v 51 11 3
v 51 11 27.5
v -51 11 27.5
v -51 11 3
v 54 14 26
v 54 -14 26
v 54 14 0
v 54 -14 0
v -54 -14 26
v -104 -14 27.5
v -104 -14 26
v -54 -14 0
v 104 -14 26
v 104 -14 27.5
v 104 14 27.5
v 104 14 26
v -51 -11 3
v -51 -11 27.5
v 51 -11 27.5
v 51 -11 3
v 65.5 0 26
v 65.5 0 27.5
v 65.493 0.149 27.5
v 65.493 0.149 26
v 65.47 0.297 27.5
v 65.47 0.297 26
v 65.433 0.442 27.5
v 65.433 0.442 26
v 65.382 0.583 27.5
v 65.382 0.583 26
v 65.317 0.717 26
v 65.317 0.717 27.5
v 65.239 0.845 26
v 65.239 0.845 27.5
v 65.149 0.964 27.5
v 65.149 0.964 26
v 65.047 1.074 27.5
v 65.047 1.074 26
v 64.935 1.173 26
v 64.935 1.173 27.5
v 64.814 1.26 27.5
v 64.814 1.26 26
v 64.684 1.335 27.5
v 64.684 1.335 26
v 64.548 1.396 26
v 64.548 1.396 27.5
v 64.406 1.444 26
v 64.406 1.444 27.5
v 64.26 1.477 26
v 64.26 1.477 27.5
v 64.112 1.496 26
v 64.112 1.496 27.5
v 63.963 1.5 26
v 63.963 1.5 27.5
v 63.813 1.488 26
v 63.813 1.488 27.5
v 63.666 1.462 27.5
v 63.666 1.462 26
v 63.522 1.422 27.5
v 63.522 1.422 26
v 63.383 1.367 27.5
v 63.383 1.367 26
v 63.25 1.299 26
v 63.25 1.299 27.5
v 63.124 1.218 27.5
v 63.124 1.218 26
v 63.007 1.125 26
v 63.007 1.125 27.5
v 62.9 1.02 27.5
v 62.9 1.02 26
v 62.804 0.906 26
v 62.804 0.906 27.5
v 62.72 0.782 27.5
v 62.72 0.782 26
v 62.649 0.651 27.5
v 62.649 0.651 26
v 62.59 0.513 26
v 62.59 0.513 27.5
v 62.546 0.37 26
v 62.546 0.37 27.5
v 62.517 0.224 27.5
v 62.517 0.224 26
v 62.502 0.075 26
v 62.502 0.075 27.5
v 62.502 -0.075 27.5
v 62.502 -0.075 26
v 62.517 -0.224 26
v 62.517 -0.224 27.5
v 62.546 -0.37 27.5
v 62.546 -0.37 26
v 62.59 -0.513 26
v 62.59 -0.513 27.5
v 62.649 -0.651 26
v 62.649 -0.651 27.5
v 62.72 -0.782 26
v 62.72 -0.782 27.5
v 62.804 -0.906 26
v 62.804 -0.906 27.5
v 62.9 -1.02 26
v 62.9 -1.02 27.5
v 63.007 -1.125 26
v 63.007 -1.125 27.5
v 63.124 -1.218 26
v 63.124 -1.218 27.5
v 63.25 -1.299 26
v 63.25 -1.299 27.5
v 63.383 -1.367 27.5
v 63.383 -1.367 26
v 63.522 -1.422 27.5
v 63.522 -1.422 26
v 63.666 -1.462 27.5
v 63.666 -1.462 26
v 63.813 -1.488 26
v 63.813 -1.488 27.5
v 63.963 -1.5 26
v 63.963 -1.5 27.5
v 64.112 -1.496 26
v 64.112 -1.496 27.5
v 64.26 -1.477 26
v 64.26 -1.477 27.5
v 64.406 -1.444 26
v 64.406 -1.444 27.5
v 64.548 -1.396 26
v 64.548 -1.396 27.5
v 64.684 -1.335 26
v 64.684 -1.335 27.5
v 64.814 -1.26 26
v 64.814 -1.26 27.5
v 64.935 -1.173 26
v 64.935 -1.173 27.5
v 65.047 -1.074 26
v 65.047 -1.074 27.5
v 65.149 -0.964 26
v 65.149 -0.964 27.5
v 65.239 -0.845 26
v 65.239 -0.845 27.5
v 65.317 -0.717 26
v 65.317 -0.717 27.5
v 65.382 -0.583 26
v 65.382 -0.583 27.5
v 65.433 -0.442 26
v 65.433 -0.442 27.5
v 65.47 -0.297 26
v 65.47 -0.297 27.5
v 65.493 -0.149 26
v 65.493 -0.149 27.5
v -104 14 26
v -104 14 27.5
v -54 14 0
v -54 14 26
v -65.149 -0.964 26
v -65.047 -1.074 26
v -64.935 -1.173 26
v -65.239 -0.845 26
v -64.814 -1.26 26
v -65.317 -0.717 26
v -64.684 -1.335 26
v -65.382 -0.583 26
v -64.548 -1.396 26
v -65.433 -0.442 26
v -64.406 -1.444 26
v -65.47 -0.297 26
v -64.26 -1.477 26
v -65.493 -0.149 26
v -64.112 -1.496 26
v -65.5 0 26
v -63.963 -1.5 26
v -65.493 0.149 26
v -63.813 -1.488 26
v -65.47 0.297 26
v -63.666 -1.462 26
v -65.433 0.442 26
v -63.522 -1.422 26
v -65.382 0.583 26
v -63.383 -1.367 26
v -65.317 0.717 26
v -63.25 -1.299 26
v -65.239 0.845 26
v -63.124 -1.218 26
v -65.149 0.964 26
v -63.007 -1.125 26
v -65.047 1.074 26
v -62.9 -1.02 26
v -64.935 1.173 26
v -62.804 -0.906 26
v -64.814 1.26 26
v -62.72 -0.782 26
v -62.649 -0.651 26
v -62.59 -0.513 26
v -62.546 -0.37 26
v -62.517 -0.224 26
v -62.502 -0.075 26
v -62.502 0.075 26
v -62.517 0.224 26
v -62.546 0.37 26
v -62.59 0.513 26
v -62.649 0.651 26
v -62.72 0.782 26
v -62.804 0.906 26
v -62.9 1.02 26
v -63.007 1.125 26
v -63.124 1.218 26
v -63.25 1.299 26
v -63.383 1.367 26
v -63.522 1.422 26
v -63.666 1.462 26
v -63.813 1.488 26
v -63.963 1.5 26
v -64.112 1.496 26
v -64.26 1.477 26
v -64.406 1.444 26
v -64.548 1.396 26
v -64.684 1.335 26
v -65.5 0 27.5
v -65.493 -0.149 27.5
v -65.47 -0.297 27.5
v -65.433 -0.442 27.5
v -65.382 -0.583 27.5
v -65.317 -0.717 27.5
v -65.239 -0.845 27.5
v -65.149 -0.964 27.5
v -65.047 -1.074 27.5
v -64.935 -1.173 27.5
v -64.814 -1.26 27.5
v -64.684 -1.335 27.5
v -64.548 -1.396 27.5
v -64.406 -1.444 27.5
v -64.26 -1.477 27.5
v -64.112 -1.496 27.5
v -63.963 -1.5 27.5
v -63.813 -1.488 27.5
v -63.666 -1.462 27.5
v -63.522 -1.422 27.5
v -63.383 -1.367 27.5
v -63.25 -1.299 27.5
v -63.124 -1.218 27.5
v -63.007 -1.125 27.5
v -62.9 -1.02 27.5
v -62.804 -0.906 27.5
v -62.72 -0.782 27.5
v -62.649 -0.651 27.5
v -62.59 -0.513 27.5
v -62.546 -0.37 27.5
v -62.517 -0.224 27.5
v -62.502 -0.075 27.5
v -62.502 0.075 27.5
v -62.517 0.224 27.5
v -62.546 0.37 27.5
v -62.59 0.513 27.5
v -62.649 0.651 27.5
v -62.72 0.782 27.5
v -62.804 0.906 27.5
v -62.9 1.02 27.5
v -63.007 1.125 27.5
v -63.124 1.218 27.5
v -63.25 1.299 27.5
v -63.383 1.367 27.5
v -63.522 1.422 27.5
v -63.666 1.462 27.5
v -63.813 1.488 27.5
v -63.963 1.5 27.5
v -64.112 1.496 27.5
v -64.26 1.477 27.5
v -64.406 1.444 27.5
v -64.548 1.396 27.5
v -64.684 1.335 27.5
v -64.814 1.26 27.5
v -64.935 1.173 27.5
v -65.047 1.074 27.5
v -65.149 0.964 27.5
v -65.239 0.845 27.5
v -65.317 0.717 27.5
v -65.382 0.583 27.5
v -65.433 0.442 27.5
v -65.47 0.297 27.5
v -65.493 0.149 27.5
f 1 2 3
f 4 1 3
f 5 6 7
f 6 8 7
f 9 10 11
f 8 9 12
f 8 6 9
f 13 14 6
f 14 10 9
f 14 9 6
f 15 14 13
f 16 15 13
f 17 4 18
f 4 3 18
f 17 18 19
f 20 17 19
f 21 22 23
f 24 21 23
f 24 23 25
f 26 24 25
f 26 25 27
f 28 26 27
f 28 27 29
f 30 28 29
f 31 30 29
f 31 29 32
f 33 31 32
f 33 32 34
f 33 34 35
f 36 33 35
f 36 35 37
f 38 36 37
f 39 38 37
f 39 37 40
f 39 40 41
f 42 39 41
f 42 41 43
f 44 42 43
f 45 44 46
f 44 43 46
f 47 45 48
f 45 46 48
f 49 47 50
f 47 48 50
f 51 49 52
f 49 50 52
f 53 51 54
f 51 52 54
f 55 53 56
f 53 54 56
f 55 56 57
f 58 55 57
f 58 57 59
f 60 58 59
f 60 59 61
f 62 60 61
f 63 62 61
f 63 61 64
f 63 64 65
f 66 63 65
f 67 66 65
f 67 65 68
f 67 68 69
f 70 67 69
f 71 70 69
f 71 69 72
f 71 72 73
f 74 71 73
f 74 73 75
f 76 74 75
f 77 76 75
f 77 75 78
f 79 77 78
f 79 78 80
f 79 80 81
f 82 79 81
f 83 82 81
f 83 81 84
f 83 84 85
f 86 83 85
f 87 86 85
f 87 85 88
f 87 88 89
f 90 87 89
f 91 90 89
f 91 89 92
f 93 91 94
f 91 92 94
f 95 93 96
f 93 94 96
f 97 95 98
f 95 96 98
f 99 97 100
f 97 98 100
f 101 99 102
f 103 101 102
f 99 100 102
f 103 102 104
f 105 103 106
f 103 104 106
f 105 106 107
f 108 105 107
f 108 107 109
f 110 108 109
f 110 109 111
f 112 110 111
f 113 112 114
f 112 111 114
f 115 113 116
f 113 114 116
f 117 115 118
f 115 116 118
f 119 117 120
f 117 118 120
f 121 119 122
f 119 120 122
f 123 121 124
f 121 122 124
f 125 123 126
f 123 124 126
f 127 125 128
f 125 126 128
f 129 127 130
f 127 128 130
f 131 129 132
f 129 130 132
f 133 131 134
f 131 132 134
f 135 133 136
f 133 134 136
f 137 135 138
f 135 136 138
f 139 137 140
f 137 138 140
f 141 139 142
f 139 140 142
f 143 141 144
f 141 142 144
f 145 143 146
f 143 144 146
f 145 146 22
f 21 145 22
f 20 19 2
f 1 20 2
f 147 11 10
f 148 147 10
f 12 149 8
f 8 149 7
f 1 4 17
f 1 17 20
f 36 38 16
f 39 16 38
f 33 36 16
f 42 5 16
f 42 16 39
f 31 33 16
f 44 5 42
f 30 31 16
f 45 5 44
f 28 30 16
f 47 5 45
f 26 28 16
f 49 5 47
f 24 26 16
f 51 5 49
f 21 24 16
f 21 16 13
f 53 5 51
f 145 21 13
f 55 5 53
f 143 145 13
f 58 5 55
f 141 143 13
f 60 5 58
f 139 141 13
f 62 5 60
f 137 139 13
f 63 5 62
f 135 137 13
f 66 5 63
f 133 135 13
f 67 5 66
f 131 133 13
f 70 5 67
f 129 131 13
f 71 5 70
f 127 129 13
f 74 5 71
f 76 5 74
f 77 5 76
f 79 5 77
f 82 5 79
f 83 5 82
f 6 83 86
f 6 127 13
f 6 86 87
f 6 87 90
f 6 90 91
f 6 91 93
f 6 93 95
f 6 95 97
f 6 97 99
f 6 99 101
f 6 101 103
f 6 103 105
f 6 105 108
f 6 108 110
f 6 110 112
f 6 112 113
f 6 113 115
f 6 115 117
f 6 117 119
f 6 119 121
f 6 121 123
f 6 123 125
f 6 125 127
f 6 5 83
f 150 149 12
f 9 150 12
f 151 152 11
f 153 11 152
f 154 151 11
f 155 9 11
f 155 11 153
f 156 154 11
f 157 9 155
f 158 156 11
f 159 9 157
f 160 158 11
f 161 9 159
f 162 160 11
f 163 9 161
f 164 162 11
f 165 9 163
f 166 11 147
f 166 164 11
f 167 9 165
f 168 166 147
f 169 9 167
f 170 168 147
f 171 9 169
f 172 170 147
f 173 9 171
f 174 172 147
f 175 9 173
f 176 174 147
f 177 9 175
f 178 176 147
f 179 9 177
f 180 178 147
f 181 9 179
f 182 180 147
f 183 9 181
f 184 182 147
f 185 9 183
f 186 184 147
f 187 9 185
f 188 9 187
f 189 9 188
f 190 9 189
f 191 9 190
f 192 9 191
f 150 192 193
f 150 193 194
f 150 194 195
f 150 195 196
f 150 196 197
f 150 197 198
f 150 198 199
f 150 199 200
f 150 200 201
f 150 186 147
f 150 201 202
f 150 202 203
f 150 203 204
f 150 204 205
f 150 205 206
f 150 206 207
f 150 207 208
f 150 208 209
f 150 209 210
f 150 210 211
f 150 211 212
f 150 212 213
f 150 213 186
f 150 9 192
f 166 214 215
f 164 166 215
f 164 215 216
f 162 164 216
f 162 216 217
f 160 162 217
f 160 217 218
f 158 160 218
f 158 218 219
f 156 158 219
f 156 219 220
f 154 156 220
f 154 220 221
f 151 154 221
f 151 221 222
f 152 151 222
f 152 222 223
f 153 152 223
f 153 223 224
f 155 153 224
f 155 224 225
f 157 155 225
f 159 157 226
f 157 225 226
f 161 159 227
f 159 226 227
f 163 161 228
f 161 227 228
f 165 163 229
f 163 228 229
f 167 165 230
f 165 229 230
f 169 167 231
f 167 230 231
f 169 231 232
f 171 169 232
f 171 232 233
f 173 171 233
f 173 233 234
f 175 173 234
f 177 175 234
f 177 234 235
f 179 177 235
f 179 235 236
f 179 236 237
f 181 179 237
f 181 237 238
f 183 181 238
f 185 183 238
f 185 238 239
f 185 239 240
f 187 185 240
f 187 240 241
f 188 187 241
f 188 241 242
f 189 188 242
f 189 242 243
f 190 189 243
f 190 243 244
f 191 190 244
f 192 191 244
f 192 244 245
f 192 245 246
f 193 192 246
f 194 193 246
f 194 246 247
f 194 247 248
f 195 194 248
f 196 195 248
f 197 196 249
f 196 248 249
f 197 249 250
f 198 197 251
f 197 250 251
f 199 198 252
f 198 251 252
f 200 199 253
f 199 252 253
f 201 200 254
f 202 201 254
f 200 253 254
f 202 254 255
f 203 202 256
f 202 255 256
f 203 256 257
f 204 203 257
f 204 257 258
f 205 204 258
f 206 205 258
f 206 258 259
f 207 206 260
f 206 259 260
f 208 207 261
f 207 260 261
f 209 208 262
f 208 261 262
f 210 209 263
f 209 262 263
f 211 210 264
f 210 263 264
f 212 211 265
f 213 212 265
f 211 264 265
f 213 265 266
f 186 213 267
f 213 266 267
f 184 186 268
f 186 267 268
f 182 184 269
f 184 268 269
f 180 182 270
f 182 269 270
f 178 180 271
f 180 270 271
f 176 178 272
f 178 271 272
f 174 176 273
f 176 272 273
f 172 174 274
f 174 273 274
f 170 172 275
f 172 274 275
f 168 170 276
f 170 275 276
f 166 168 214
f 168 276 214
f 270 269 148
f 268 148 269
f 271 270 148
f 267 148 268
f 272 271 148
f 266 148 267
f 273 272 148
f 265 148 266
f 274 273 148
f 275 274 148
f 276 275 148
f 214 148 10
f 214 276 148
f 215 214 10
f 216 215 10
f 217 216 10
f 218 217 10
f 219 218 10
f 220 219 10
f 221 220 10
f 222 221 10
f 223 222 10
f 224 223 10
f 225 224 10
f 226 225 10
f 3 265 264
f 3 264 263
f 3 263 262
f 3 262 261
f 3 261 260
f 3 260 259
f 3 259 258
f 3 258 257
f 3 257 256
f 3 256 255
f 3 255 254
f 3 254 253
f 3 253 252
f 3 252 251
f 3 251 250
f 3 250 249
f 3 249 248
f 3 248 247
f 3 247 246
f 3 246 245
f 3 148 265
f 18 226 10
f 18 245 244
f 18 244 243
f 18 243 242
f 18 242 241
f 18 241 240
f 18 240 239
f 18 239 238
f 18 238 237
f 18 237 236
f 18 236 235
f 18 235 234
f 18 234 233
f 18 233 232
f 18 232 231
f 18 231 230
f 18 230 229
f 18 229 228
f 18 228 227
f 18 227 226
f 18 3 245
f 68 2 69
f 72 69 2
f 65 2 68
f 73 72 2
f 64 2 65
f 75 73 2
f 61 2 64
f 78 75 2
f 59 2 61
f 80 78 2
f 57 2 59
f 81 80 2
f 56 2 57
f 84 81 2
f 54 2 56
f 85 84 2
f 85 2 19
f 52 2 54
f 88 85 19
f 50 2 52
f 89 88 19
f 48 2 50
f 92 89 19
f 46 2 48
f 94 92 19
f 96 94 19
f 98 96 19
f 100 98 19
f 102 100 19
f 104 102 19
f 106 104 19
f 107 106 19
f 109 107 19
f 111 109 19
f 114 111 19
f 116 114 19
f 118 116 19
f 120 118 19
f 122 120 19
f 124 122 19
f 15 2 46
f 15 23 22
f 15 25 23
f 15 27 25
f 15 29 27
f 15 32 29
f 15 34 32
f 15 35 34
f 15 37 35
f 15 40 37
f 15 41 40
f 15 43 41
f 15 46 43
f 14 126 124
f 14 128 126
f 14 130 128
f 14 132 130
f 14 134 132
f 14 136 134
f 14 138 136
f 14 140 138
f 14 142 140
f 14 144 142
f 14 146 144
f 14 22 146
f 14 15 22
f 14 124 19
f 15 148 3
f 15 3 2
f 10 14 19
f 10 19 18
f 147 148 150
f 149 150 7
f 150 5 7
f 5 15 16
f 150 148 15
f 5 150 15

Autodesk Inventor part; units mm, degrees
ref_plane "YZ Plane" through (0, 0, 0) normal (1, 0, 0) x (0, 1, 0)
ref_plane "XZ Plane" through (0, 0, 0) normal (0, 1, 0) x (-1, 0, 0)
ref_plane "XY Plane" through (0, 0, 0) normal (0, 0, 1) x (1, 0, 0)
sketch "Эскиз1" plane through (0, 0, 0) normal (0, 0, 1) x (1, 0, 0)
  line L0 (-54, -14) -> (54, -14)
  line L1 (54, -14) -> (54, 14)
  line L2 (54, 14) -> (-54, 14)
  line L3 (-54, 14) -> (-54, -14)
  line L4 (-54, -14) -> (54, 14) construction
  line L5 (54, -14) -> (-54, 14) construction
  point P0 (0, 0)
  dimension "d0" = 108
  dimension "d1" = 28
extrude "Выдавливание1" add sketch "Эскиз1" along normal blind 27.5
sketch "Эскиз2" plane through (0, 0, 27.5) normal (0, 0, 1) x (1, 0, 0)
  line L0 (-51, -11) -> (51, -11)
  line L1 (51, -11) -> (51, 11)
  line L2 (51, 11) -> (-51, 11)
  line L3 (-51, 11) -> (-51, -11)
  line L4 (-51, -11) -> (51, 11) construction
  line L5 (51, -11) -> (-51, 11) construction
  line L6 (54, 14) -> (-54, 14) projected
  line L7 (54, -14) -> (54, 14) projected
  point P0 (0, 0)
  dimension "d4" = 3
  dimension "d5" = 3
extrude "Выдавливание2" cut sketch "Эскиз2" against normal blind 24.5
sketch "Эскиз3" plane through (54, -14, 0) normal (1, 0, 0) x (0, 0, -1)
  line L0 (0, 28) -> (-27.5, 28) projected
  line L1 (0, 0) -> (-27.5, 0) projected
  line L2 (-27.5, 28) -> (-26, 28)
  line L3 (-26, 28) -> (-26, 0)
  line L4 (-26, 0) -> (-27.5, 0)
  line L5 (-27.5, 0) -> (-27.5, 28)
  point P0 (0, 14)
  dimension "d8" = 1.5
extrude "Выдавливание3" add sketch "Эскиз3" along normal blind 50
sketch "Эскиз4" plane through (0, 0, 27.5) normal (0, 0, 1) x (1, 0, 0)
  circle A0 centre (64, 0) radius 1.5
  line L0 (-54, -14) -> (104, -14) projected
  point P0 (0, 0)
  point P1 (54, -14)
  dimension "d11" = 3
  dimension "d12" = 14
  dimension "d13" = 10
extrude "Выдавливание4" cut sketch "Эскиз4" against normal blind 50
mirror "Зеркальное отражение1" about plane through (0, 0, 0) normal (1, 0, 0) of "Выдавливание3", "Выдавливание4"
properties part number "000.009 - Короб"
